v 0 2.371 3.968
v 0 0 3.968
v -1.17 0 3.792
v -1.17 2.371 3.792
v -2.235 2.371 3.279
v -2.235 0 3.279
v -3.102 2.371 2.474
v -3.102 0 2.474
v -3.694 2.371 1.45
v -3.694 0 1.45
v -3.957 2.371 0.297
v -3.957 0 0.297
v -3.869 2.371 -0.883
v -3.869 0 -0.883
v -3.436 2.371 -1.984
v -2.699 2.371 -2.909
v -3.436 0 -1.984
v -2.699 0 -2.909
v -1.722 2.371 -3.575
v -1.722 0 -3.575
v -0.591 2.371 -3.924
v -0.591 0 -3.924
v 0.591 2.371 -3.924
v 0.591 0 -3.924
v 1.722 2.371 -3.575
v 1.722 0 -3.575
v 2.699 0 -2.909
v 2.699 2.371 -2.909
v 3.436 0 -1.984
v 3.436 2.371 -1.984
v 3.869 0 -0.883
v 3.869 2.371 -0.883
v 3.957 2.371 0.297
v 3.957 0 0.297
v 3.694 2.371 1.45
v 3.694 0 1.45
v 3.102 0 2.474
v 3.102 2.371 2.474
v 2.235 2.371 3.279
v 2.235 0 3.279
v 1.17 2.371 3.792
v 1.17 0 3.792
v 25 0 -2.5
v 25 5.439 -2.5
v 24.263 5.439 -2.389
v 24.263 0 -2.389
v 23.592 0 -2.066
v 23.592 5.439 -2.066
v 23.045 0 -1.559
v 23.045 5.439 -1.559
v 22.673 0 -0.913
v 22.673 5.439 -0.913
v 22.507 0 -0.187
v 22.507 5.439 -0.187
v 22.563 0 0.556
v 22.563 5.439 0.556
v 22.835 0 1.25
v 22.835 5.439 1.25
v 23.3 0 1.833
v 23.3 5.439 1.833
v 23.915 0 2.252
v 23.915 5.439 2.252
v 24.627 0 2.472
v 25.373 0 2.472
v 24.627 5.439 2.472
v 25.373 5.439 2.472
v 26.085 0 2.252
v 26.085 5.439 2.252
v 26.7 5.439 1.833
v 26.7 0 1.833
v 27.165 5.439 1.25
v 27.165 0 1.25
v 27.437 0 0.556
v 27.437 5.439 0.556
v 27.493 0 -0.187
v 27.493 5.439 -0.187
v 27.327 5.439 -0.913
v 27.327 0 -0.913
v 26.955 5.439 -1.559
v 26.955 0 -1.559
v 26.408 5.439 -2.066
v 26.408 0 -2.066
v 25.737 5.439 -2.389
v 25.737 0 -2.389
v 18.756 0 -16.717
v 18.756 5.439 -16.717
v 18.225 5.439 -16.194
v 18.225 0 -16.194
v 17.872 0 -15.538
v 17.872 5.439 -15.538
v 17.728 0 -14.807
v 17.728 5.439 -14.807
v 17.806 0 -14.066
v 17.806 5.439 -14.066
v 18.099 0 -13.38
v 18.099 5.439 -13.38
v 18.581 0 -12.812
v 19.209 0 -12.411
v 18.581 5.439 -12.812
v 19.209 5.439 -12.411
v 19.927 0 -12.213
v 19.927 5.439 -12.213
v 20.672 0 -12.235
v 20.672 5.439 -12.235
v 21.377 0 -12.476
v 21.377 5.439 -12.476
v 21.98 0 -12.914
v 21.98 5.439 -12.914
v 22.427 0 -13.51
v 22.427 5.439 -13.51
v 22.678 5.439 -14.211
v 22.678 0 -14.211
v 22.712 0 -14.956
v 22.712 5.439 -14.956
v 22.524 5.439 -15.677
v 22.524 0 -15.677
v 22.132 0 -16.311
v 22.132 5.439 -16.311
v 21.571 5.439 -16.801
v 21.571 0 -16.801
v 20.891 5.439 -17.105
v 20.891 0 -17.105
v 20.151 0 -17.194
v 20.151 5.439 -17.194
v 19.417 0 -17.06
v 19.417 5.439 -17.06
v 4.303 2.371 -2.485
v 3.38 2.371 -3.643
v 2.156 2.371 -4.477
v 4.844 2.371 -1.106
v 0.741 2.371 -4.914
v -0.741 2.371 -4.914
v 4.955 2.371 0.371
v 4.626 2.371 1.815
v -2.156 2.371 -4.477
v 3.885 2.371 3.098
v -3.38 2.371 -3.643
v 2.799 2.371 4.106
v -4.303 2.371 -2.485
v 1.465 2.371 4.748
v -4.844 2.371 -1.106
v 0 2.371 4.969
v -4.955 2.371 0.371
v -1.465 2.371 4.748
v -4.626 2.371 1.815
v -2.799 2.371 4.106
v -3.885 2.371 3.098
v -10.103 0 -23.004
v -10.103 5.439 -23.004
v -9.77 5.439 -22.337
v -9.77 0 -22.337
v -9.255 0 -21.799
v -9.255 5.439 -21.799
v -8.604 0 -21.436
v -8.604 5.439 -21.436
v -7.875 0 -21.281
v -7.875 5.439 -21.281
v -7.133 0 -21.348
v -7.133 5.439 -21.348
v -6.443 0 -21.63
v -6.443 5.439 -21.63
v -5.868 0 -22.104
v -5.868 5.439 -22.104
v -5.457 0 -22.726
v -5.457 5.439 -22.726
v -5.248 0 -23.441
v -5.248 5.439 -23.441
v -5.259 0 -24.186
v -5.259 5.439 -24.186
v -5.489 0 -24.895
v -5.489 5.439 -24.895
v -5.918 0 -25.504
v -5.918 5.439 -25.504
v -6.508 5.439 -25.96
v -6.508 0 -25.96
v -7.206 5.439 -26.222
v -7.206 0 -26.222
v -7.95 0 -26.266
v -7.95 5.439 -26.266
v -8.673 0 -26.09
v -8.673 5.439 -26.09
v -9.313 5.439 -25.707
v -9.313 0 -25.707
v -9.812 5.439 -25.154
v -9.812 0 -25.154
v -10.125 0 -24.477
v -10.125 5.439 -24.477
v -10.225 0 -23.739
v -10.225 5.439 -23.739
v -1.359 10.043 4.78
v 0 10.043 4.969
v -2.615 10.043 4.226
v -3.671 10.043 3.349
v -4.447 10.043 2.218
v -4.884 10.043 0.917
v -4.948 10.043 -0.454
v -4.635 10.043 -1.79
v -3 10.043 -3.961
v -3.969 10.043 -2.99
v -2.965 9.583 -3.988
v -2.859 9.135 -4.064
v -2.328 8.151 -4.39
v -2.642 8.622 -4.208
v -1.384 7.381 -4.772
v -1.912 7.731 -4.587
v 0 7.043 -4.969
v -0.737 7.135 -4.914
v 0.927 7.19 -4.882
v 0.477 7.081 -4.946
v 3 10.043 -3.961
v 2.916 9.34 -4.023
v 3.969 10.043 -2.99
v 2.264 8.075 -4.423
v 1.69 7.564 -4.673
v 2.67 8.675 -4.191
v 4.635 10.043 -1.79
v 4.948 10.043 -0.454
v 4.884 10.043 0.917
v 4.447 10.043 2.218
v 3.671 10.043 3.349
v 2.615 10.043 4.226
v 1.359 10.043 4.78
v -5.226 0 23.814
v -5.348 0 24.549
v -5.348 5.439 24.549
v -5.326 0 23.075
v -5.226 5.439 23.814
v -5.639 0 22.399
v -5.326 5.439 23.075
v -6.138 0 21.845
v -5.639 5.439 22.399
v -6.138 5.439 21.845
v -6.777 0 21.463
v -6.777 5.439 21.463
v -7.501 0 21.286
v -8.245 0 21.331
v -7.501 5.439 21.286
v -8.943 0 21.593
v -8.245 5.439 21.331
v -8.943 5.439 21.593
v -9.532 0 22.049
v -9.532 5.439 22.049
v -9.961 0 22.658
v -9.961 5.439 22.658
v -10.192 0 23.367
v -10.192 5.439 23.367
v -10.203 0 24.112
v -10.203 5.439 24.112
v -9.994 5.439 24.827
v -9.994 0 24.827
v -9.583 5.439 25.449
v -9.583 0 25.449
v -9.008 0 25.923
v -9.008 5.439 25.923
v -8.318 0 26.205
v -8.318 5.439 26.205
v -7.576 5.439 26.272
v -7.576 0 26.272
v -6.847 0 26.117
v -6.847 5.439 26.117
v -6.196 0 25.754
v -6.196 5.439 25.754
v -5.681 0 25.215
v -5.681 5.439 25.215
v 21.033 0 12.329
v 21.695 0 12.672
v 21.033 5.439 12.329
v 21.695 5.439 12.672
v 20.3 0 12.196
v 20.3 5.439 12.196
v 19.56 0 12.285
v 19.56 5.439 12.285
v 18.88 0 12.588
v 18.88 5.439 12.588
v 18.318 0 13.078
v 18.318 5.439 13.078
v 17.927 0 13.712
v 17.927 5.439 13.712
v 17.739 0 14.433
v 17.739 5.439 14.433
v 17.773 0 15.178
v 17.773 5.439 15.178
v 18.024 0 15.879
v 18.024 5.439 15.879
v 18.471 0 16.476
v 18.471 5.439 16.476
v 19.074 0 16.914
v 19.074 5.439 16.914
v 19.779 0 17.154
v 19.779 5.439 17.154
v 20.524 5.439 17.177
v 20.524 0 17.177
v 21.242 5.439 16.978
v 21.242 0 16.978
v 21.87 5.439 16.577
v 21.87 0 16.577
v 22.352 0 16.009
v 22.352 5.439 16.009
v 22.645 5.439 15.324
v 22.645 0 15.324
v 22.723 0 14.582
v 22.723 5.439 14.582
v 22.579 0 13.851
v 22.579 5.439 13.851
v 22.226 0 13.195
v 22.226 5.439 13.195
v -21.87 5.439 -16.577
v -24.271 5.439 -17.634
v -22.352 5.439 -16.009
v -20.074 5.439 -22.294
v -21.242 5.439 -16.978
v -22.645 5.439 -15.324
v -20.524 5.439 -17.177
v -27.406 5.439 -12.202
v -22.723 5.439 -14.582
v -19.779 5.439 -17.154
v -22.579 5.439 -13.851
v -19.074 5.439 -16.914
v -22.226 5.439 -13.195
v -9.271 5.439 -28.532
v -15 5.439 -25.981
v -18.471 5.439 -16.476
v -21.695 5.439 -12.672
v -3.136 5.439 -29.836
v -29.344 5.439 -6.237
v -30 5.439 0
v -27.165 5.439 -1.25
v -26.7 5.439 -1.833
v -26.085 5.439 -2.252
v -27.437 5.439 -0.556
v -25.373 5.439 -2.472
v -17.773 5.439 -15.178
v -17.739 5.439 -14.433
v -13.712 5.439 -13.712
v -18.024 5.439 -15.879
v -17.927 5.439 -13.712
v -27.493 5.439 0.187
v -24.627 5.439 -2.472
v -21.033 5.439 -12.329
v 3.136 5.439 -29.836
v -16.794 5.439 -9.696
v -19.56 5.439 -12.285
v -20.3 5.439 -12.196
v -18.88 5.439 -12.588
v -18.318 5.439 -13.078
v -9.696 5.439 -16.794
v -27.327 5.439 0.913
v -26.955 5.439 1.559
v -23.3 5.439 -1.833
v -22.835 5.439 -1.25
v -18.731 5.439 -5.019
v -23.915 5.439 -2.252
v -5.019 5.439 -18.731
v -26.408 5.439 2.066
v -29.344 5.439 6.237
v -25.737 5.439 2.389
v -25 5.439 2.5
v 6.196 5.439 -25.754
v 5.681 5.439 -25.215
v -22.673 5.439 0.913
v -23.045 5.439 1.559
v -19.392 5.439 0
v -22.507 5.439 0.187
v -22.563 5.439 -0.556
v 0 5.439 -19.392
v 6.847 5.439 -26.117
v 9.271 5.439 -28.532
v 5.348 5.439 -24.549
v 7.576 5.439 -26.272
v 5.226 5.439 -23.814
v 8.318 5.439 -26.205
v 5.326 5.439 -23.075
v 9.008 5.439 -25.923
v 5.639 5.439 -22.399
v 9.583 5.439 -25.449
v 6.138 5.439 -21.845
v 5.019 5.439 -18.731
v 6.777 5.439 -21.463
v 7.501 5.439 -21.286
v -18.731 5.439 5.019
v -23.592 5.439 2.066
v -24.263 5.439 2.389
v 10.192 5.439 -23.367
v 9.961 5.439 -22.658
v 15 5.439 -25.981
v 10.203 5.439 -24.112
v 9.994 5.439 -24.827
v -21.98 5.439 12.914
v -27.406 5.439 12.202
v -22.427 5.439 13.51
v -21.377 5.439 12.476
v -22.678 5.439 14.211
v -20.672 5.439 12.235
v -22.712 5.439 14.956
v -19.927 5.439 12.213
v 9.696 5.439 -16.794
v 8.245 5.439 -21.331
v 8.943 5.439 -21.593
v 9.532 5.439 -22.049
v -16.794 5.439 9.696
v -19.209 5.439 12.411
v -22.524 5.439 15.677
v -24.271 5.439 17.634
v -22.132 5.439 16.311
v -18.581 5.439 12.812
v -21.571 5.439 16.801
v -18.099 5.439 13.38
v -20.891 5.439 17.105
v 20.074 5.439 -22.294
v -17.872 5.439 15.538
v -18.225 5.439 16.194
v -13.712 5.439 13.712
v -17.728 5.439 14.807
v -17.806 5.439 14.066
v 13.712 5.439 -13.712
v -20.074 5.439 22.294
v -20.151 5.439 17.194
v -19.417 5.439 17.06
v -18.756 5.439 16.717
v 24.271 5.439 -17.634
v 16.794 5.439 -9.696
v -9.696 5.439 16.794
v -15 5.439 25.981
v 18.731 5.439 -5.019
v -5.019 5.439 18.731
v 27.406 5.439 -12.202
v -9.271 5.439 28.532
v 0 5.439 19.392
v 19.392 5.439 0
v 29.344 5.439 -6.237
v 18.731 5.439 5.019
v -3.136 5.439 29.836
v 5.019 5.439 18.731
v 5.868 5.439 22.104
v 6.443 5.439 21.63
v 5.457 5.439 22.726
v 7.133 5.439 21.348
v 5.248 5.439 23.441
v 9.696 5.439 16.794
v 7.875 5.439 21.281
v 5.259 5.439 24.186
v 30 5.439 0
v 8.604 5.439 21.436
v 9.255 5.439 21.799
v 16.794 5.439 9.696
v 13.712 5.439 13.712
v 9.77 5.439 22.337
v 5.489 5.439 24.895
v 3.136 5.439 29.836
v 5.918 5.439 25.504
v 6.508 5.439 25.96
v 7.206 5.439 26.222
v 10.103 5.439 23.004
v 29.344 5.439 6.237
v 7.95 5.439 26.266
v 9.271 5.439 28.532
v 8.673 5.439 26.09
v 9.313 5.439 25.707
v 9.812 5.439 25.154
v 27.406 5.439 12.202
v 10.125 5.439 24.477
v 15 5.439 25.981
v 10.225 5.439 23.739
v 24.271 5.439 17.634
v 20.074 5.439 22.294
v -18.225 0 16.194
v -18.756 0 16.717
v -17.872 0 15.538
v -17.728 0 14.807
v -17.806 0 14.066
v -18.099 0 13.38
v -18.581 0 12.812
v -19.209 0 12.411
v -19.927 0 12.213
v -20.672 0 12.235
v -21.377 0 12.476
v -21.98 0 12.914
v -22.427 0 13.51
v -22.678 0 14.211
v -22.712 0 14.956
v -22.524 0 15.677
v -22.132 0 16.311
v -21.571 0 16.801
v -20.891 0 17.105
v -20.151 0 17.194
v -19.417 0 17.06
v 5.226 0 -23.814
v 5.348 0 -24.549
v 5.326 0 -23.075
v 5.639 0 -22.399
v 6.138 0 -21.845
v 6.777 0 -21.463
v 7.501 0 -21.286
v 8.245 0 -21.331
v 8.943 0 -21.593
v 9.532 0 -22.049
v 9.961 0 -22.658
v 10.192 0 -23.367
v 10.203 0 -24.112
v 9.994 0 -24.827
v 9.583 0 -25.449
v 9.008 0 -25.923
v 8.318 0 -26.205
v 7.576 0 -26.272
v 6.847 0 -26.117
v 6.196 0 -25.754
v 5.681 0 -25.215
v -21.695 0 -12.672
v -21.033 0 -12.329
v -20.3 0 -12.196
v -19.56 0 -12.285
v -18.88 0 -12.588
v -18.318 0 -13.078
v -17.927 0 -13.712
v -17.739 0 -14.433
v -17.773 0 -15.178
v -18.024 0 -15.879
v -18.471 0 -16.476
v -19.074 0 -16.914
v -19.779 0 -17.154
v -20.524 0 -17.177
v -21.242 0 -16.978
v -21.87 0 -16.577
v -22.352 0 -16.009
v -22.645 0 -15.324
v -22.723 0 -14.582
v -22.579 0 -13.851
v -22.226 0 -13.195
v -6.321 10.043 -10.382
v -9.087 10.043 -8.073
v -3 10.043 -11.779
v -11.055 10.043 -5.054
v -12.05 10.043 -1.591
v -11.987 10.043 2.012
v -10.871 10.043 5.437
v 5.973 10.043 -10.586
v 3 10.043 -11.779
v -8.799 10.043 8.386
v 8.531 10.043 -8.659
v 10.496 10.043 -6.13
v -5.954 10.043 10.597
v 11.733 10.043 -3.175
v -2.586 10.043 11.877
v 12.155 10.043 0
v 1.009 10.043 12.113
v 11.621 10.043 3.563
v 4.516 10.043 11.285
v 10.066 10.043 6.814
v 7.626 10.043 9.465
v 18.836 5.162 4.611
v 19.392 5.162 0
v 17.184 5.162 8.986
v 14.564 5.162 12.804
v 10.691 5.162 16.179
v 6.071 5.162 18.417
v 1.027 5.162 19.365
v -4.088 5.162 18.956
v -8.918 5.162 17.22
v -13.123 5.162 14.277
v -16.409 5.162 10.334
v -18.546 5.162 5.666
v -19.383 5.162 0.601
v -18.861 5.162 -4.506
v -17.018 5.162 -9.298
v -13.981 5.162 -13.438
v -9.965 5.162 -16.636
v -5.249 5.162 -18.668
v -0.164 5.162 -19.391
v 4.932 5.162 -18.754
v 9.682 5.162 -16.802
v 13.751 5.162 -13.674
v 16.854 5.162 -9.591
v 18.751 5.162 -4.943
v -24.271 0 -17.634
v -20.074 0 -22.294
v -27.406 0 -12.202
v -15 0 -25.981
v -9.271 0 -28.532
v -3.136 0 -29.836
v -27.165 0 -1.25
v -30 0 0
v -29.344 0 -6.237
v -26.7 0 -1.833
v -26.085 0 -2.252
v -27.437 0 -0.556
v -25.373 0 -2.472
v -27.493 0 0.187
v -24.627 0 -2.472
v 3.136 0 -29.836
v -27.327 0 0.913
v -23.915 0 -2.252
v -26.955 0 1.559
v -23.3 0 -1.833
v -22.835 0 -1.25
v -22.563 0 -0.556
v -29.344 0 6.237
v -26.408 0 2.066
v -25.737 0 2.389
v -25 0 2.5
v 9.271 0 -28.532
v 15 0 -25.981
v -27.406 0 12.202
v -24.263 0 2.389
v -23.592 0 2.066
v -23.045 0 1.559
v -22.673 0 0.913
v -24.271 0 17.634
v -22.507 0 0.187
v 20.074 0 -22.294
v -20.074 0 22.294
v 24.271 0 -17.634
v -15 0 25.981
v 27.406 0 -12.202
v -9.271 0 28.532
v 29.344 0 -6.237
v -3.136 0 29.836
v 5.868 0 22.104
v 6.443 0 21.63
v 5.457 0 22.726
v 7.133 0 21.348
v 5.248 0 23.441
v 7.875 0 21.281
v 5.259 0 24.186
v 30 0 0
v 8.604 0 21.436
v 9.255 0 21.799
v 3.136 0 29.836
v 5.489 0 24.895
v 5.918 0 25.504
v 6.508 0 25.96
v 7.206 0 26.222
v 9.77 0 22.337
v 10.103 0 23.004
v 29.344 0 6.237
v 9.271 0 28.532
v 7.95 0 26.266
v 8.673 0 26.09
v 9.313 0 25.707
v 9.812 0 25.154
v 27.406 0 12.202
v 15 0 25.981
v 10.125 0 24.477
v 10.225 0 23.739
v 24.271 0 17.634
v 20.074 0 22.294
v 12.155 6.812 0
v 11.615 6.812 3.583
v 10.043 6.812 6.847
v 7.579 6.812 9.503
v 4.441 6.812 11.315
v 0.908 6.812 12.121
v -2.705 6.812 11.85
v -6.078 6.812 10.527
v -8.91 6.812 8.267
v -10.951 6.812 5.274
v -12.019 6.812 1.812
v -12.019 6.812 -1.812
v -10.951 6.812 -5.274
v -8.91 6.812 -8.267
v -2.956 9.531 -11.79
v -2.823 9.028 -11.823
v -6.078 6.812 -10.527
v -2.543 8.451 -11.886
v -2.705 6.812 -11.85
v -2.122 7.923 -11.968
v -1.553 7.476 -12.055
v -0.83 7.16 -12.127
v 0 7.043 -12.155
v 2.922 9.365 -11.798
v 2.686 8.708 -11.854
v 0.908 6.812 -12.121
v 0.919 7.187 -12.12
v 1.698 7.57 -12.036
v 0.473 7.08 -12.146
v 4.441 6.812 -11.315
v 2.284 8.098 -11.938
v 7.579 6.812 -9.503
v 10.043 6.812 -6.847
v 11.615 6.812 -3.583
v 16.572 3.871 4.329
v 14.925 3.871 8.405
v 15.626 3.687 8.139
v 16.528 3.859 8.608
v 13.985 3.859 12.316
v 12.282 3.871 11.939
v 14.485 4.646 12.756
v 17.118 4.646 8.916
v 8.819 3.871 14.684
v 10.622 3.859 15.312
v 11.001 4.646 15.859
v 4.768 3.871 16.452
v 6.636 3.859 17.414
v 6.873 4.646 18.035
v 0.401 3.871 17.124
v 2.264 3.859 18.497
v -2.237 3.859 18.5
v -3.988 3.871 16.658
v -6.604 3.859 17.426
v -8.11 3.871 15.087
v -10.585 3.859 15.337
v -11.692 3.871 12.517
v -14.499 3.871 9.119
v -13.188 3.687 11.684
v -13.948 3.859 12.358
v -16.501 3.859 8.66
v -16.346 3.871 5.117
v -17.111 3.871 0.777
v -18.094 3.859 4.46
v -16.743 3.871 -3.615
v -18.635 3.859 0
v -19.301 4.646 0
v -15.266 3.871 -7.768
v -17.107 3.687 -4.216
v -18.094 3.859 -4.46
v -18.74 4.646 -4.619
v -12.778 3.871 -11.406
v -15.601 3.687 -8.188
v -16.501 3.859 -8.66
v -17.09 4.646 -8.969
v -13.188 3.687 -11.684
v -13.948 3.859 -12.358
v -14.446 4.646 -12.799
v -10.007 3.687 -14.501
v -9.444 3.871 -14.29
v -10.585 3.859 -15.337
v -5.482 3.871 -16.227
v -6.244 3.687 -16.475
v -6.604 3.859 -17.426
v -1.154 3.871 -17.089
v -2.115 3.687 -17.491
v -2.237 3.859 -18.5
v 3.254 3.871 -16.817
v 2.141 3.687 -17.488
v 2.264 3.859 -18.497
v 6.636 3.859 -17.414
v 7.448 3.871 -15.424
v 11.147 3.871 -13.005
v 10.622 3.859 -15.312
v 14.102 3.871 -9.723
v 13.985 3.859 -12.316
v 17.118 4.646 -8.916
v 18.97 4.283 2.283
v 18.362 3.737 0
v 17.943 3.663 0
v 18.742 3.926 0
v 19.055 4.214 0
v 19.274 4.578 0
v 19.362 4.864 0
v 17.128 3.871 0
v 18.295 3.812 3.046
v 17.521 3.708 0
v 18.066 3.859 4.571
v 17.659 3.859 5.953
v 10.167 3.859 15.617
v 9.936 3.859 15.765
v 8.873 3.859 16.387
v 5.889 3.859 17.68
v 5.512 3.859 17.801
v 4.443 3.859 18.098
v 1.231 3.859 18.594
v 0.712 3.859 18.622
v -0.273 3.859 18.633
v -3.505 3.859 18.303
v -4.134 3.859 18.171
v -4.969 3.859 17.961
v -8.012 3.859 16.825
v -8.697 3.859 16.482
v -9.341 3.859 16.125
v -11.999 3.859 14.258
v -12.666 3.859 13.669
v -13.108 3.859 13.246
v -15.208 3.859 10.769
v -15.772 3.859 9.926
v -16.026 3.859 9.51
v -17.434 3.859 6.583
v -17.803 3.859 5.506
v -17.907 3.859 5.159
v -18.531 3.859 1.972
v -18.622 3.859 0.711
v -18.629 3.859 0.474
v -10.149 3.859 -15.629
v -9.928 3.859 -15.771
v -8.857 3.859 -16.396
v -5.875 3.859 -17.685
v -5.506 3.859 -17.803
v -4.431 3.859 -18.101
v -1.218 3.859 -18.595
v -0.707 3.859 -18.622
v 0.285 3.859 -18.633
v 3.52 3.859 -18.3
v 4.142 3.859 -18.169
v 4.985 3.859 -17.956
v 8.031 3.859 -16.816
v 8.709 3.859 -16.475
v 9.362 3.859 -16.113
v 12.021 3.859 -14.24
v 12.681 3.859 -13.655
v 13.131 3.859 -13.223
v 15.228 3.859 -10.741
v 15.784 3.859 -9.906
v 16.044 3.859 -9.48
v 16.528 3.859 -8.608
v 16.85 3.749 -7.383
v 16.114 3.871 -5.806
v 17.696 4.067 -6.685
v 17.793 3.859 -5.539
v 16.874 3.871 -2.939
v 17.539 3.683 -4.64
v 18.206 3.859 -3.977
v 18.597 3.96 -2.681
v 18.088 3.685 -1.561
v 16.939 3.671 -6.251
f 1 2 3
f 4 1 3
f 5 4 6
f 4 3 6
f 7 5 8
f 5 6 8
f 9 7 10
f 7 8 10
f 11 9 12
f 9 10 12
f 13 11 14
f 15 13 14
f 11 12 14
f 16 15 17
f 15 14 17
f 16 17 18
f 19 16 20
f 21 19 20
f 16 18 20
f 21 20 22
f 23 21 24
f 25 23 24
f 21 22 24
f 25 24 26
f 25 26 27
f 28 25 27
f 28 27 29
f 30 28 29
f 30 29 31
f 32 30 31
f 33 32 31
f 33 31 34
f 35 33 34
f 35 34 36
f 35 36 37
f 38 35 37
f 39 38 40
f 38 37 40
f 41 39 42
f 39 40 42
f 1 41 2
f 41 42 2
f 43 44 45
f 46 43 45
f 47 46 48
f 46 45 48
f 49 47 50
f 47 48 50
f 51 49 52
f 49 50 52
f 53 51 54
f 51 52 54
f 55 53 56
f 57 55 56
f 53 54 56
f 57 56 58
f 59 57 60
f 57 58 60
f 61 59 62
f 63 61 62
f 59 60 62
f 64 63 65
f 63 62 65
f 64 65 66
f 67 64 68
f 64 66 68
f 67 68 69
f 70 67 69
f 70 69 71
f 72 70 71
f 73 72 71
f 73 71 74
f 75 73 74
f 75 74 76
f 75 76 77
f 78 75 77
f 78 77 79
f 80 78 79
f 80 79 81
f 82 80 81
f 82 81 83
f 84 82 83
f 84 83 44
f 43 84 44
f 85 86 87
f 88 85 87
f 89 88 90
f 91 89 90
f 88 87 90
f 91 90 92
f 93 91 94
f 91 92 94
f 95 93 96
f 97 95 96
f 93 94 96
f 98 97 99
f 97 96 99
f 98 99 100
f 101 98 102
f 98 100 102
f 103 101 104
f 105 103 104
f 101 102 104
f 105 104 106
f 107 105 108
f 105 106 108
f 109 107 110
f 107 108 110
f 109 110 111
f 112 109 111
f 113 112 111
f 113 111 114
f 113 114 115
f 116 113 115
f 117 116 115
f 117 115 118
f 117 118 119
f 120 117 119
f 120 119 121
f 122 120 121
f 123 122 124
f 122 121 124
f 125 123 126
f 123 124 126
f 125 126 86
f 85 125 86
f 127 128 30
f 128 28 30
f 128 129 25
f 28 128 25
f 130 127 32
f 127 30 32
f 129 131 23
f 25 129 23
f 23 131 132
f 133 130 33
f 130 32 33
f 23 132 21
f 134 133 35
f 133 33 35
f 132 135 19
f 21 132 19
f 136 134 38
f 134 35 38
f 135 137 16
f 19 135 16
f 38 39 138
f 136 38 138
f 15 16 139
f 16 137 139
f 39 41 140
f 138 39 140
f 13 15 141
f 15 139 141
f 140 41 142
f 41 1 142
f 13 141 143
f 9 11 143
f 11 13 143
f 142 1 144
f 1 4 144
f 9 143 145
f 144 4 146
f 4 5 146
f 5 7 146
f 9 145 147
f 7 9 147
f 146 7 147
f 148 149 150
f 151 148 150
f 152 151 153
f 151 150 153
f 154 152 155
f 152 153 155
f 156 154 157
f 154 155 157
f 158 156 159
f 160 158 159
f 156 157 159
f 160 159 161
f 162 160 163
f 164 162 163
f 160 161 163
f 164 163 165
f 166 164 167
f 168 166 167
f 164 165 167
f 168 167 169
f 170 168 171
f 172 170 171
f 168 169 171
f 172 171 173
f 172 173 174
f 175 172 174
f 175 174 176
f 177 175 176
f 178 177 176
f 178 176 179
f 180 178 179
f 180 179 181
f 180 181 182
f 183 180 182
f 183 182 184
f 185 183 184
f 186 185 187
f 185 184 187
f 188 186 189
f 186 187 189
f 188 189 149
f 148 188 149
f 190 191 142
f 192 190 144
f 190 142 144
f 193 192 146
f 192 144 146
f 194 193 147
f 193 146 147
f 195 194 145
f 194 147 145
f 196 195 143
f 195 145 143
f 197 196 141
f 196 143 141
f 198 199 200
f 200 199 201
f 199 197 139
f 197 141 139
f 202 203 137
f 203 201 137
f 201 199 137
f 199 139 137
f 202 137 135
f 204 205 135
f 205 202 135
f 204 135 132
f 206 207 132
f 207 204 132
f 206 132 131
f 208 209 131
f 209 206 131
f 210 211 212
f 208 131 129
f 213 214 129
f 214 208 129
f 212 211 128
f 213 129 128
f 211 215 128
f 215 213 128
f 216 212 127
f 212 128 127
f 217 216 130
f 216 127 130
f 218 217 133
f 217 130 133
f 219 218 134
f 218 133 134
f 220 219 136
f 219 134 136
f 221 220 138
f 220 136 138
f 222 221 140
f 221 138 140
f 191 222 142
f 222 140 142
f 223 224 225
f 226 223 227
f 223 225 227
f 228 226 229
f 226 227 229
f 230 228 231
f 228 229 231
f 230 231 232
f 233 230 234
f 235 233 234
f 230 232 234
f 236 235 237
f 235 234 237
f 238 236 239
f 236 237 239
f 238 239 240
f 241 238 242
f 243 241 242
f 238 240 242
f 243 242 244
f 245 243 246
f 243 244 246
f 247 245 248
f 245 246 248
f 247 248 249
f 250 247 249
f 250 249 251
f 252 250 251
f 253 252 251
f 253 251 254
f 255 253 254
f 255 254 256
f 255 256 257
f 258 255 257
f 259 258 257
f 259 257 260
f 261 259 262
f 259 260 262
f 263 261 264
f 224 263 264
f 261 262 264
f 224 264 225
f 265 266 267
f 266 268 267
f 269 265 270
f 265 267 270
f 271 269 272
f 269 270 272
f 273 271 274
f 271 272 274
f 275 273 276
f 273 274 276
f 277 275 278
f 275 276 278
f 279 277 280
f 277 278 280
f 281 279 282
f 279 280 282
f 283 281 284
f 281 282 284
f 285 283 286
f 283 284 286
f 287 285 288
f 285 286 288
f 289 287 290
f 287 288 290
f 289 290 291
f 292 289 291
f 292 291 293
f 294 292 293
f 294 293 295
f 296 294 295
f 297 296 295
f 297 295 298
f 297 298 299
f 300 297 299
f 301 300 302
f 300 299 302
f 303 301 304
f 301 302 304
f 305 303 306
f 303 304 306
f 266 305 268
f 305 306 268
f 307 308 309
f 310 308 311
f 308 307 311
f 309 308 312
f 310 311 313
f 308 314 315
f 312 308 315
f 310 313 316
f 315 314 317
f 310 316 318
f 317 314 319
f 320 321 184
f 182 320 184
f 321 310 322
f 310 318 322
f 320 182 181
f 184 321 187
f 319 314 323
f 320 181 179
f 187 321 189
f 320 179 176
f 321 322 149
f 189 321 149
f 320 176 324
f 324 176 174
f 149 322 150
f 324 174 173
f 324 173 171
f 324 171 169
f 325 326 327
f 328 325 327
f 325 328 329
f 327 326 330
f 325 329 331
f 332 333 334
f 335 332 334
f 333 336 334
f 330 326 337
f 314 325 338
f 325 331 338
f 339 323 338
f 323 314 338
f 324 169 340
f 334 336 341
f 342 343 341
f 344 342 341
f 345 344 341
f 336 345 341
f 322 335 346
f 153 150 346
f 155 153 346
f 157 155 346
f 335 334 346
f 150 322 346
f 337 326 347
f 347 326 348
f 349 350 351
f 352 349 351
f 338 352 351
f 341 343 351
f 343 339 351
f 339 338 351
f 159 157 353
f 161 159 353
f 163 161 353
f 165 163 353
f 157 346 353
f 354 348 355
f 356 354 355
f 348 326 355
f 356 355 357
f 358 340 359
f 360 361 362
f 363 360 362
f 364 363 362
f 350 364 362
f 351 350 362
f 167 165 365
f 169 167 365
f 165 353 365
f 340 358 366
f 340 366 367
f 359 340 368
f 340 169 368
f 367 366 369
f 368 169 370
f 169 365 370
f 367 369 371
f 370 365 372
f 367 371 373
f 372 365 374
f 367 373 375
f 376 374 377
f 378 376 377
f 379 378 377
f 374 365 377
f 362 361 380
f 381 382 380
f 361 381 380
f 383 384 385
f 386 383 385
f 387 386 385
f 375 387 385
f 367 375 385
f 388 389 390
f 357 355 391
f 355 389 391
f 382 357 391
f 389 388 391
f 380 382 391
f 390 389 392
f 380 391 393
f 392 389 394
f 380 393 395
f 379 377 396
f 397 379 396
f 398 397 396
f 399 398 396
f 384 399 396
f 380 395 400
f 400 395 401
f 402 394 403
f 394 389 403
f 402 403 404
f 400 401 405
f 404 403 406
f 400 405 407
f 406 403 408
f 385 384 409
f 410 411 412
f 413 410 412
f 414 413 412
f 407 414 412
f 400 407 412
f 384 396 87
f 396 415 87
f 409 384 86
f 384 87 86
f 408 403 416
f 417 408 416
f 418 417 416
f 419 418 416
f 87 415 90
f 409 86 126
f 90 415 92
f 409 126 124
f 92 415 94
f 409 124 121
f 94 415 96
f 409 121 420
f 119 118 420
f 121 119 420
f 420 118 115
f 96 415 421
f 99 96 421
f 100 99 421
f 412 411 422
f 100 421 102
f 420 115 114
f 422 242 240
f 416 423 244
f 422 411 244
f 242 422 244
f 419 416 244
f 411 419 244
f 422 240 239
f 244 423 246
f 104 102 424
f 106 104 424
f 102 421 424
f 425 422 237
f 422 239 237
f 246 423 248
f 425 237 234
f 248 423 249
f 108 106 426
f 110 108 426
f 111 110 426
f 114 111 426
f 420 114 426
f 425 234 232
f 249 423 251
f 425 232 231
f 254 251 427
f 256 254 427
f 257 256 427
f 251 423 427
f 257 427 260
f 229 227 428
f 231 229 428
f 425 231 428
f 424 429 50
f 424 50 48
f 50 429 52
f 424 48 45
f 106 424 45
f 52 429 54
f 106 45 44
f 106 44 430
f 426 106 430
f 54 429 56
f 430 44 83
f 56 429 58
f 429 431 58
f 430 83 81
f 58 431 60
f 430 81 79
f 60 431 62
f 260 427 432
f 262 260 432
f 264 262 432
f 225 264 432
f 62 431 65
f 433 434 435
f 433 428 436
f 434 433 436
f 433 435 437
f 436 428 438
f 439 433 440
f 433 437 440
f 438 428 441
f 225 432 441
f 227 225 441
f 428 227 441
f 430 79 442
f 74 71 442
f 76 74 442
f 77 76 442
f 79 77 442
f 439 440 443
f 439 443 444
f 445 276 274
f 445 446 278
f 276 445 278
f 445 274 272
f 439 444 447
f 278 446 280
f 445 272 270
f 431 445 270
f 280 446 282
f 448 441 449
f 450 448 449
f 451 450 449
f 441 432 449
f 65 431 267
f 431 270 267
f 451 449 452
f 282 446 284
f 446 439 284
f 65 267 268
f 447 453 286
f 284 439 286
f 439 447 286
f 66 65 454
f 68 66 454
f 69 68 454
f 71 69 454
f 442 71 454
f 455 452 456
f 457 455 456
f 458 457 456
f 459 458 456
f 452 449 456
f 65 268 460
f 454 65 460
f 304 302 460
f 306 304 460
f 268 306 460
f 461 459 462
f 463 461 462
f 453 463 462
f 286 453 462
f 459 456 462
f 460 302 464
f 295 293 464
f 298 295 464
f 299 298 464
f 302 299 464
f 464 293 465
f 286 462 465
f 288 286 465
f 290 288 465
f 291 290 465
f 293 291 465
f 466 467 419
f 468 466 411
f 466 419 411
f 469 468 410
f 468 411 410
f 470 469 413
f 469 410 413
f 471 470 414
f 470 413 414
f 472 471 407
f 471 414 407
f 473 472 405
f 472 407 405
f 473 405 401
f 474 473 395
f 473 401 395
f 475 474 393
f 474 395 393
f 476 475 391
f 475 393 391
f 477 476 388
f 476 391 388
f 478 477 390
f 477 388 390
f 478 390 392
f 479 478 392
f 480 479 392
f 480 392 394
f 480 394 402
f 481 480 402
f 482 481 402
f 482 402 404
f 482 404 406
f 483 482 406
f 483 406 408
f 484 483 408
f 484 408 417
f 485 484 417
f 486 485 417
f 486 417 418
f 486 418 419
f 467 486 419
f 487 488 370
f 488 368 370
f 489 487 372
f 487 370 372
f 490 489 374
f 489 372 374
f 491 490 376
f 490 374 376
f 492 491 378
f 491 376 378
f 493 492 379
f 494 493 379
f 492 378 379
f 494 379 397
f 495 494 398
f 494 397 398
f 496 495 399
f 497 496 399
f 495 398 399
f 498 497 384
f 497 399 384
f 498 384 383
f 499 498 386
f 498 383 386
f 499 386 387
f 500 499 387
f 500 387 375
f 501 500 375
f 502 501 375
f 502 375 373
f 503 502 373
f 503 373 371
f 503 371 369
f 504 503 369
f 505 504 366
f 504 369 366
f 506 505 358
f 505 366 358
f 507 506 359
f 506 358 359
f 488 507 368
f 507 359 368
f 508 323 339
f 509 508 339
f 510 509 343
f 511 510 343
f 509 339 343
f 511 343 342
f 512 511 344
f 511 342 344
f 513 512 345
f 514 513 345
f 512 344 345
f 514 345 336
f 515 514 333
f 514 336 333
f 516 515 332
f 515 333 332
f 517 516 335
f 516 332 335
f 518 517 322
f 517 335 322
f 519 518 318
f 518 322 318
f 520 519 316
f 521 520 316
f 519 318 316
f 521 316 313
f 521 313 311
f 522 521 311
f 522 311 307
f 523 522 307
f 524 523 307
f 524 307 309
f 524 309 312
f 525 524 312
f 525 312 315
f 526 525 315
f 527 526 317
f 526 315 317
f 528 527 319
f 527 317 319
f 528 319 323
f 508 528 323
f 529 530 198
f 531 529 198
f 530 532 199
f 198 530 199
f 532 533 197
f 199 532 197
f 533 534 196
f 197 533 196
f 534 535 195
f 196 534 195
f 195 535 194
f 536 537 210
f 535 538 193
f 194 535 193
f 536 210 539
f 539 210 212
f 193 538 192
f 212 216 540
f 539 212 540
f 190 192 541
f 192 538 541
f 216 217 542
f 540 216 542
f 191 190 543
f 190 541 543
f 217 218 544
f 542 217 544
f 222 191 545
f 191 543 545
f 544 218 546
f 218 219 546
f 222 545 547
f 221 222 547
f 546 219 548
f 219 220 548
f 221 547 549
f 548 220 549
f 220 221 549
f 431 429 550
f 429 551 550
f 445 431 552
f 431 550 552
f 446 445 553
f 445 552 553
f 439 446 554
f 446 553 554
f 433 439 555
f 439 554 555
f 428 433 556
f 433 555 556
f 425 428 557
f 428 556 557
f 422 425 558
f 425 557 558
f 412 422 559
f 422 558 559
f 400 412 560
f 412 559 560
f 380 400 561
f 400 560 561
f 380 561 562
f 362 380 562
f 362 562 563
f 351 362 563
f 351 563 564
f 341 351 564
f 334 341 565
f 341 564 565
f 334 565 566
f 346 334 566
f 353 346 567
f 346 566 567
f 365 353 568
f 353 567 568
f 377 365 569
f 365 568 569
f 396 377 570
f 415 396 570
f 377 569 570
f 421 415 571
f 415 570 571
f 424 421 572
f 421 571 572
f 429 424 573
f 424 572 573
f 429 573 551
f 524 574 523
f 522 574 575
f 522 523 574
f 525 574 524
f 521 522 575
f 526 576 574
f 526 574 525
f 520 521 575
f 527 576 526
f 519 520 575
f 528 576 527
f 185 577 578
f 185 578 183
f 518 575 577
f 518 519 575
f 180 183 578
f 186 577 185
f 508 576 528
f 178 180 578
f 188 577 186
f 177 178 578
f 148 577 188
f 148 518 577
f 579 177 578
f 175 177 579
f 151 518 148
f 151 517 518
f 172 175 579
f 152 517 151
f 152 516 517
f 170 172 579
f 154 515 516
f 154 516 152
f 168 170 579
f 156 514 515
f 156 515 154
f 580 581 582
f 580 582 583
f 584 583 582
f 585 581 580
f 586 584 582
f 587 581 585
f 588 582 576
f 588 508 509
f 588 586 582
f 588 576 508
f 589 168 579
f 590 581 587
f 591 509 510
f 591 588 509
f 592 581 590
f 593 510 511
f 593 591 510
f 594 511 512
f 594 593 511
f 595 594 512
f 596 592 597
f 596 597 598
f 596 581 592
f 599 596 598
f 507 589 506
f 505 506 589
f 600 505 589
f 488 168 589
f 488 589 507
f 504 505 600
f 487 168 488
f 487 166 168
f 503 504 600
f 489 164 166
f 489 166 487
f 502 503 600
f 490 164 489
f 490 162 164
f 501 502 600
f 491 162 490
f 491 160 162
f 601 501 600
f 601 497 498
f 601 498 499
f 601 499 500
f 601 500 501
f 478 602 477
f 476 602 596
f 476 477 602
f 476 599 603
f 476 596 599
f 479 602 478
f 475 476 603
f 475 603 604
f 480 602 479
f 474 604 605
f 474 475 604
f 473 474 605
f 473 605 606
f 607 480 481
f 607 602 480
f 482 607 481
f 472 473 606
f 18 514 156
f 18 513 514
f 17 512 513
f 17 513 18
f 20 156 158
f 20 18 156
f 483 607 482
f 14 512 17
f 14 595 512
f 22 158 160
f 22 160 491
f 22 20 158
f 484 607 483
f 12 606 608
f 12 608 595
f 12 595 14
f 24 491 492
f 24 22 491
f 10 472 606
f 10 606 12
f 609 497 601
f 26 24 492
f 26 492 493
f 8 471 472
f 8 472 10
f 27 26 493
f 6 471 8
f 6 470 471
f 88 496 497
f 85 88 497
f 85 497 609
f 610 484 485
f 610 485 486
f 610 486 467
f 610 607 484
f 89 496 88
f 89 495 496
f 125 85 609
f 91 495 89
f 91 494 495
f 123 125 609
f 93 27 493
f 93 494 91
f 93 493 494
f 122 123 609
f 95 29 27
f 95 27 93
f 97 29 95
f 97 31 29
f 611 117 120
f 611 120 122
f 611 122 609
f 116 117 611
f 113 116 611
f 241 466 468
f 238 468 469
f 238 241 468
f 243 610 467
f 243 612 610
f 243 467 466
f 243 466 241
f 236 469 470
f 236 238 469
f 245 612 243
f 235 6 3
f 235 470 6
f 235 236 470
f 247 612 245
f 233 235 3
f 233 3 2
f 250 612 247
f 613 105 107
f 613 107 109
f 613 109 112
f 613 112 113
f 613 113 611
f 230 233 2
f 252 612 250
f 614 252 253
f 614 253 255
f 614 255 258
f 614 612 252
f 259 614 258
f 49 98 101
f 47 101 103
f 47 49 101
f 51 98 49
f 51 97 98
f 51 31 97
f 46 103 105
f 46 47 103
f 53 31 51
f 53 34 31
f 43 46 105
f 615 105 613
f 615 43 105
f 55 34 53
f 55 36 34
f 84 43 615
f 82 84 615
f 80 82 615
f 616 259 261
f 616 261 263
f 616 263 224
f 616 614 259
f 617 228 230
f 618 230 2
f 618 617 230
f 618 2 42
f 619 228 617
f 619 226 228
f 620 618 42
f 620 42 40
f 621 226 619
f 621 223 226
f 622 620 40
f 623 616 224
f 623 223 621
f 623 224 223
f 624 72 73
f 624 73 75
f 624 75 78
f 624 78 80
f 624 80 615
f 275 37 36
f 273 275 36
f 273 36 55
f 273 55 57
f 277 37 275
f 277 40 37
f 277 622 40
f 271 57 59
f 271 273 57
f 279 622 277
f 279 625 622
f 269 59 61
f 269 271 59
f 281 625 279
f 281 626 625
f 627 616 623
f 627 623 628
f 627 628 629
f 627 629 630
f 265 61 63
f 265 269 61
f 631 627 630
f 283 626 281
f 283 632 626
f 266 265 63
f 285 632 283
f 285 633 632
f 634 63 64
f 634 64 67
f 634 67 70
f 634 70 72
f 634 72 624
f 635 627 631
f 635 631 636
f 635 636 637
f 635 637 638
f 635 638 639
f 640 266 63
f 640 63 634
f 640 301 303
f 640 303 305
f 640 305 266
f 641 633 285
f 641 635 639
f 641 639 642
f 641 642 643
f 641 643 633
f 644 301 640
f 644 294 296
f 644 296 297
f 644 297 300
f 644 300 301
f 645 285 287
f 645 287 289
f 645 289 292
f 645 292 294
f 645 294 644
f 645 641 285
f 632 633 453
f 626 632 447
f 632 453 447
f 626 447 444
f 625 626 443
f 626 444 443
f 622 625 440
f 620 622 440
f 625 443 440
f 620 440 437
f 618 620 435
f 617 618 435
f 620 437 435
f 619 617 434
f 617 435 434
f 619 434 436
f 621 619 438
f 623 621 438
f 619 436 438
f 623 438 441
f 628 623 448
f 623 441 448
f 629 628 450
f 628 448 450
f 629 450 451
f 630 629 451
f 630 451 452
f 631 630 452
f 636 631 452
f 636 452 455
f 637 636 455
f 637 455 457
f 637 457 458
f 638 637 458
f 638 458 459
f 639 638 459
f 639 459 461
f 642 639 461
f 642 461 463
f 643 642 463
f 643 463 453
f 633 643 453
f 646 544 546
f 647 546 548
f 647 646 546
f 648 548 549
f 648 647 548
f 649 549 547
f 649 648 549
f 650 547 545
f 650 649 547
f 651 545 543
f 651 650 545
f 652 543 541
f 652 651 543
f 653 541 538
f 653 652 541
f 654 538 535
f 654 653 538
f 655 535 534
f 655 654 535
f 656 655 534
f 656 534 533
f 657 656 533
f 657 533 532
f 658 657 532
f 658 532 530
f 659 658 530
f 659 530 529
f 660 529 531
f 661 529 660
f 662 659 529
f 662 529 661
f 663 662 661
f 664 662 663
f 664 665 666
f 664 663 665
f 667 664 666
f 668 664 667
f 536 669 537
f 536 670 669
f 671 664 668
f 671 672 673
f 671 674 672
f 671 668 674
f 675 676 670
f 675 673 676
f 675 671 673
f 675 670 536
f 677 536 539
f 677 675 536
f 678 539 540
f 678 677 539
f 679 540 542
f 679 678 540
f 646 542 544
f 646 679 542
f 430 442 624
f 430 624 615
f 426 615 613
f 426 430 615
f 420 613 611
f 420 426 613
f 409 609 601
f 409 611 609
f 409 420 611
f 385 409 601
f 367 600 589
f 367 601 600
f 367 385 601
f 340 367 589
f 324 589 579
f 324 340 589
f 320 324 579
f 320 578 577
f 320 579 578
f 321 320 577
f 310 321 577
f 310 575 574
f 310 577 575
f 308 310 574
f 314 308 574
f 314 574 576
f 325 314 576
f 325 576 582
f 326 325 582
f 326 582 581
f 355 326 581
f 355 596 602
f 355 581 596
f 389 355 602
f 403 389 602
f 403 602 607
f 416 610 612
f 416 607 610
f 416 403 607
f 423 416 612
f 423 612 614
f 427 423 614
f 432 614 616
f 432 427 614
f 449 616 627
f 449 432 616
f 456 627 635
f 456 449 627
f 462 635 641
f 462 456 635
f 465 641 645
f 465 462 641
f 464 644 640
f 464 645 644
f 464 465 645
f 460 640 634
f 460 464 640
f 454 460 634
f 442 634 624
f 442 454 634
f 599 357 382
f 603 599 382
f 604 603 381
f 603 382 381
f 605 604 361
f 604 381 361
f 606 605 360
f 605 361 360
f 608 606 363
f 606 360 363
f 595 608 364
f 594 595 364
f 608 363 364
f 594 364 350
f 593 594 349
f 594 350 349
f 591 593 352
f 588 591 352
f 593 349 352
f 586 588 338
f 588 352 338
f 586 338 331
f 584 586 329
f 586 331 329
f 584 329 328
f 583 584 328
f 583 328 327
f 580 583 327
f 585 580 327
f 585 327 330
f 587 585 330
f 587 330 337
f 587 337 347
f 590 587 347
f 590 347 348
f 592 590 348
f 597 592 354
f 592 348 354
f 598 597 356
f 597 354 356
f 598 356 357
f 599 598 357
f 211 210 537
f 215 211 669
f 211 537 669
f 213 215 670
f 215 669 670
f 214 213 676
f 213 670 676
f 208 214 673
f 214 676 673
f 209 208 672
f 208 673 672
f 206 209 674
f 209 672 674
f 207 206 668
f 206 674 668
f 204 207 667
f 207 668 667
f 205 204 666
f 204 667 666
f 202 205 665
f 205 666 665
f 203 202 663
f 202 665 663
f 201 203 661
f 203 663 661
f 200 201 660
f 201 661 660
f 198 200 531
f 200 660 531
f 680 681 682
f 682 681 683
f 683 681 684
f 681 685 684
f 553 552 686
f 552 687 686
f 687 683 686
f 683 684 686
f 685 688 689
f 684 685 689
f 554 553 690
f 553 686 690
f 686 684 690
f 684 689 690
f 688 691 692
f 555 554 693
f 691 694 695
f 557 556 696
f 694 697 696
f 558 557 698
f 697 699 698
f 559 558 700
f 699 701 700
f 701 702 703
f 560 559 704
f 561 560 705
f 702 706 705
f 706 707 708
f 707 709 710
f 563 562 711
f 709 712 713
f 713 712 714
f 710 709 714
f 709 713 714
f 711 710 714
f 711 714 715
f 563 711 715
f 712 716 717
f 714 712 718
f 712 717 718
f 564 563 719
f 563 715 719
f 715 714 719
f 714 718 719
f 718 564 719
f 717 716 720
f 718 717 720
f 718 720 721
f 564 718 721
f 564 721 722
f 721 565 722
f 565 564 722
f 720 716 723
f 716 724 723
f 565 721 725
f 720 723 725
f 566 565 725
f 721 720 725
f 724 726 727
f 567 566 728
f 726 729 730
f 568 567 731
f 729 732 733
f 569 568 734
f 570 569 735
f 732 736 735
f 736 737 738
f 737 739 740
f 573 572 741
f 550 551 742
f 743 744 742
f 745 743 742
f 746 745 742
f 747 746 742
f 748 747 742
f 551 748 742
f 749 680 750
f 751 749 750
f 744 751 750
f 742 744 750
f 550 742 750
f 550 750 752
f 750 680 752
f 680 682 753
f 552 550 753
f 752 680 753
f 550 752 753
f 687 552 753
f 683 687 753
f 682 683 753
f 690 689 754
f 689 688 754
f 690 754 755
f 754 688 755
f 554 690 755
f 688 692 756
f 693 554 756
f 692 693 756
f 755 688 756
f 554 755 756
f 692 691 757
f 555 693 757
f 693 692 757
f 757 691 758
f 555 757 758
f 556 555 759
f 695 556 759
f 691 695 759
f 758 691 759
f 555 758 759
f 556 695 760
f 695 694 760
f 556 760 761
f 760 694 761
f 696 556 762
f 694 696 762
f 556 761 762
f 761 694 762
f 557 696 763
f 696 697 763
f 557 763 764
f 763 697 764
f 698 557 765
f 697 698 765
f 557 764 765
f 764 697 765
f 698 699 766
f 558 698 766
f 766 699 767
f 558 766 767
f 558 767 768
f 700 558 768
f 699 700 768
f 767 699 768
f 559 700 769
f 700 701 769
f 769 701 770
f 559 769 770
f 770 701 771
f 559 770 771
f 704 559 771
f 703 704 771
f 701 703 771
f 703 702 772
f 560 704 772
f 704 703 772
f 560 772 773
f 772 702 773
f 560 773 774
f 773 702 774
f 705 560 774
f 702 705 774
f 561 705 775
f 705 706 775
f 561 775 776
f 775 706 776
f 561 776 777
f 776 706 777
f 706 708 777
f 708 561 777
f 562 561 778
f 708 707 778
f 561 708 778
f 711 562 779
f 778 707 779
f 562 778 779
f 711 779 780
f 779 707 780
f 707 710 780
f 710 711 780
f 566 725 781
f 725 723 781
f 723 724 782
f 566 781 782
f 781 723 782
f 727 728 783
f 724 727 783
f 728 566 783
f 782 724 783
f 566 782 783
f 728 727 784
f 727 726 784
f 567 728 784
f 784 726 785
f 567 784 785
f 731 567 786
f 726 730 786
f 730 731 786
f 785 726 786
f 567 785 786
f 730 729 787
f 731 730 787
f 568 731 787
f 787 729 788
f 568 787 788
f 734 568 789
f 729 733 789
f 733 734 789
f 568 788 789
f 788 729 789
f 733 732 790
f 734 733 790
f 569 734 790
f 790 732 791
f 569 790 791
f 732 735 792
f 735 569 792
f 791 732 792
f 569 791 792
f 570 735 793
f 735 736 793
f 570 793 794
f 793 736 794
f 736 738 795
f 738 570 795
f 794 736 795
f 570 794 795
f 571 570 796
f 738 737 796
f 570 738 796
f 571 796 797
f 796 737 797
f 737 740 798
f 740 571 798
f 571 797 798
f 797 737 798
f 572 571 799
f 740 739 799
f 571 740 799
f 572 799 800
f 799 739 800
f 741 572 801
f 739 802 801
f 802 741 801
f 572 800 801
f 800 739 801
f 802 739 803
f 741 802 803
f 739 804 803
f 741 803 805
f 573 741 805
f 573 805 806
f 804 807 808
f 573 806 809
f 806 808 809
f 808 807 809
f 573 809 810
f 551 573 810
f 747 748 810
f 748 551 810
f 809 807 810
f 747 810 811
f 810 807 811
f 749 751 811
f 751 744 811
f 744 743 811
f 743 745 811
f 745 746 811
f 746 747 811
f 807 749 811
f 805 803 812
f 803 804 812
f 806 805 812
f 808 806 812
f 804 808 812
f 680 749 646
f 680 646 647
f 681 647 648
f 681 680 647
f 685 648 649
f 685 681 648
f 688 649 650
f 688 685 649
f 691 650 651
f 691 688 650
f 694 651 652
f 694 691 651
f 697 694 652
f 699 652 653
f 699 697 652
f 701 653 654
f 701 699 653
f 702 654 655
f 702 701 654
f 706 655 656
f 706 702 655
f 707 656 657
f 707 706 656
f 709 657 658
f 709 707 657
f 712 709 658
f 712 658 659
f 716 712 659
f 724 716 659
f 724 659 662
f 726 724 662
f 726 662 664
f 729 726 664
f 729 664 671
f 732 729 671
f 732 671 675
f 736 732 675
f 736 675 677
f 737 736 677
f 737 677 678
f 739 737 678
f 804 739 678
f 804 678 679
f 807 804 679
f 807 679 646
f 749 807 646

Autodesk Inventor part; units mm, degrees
ref_plane "YZ Plane" through (0, 0, 0) normal (1, 0, 0) x (0, 1, 0)
ref_plane "XZ Plane" through (0, 0, 0) normal (0, 1, 0) x (-1, 0, 0)
ref_plane "XY Plane" through (0, 0, 0) normal (0, 0, 1) x (1, 0, 0)
sketch "Sketch1" plane through (0, 0, 0) normal (0, 0, 1) x (1, 0, 0)
  line L0 (30, 0) -> (30, 5.439)
  line L1 (30, 5.439) -> (19.392, 5.439)
  line L2 (19.392, 5.439) -> (19.392, 2.5321)
  line L3 (12.155, 10.043) -> (0, 10.043)
  line L4 (0, 10.043) -> (0, 0)
  line L5 (0, 0) -> (30, 0)
  line L6 (12.155, 10.043) -> (12.155, 6.812)
  line L7 (12.155, 6.812) -> (19.392, 2.5321)
  dimension "d1" = 30
  dimension "d2" = 10.043
  dimension "d3" = 5.439
  dimension "d4" = 10.608
  dimension "d5" = 3.231
  dimension "d6" = 120.6
  dimension "d7" = 17.845
revolve "Revolution1" add sketch "Sketch1" angle 360 about axis through (0, 10.043, 0) along (0, -1, 0)
fillet "Fillet1" radius 1.5 1 edges at (-19.392, 2.5321, 0)
sketch "Sketch2" plane through (0, 0, 0) normal (0, -1, 0) x (1, 0, 0)
  circle A0 centre (0, 0) radius 30 projected
  point P0 (25, 0)
  dimension "d10" = 25
hole "Hole1" at (25, 0, 0) direction (0, 1, 0) diameter 5 end through all
pattern_circular "Circular Pattern1" count 10 over 360 about axis through (0, -10, 0) along (0, 1, 0) of "Hole1"
sketch "Sketch3" plane through (0, 10.043, 0) normal (0, 1, 0) x (1, 0, 0)
  circle A0 centre (0, 0) radius 12.155 projected
hole "Hole2" at (0, 10.043, 0) direction (0, -1, 0) diameter 7.936 end through all counterbore diameter 9.938 counterbore depth 7.672
sketch "Sketch4" plane through (0, 0, 0) normal (0, 0, 1) x (1, 0, 0)
  line L0 (-12.155, 10.043) -> (12.155, 10.043) construction
  line L1 (0, -6.974) -> (0, 27.06) construction
  point P0 (0, 10.043)
hole "Hole3" at (0, 10.043, 0) direction (0, 0, -1) diameter 6 end through all
properties part number "212-04" material "Steel, Alloy"
